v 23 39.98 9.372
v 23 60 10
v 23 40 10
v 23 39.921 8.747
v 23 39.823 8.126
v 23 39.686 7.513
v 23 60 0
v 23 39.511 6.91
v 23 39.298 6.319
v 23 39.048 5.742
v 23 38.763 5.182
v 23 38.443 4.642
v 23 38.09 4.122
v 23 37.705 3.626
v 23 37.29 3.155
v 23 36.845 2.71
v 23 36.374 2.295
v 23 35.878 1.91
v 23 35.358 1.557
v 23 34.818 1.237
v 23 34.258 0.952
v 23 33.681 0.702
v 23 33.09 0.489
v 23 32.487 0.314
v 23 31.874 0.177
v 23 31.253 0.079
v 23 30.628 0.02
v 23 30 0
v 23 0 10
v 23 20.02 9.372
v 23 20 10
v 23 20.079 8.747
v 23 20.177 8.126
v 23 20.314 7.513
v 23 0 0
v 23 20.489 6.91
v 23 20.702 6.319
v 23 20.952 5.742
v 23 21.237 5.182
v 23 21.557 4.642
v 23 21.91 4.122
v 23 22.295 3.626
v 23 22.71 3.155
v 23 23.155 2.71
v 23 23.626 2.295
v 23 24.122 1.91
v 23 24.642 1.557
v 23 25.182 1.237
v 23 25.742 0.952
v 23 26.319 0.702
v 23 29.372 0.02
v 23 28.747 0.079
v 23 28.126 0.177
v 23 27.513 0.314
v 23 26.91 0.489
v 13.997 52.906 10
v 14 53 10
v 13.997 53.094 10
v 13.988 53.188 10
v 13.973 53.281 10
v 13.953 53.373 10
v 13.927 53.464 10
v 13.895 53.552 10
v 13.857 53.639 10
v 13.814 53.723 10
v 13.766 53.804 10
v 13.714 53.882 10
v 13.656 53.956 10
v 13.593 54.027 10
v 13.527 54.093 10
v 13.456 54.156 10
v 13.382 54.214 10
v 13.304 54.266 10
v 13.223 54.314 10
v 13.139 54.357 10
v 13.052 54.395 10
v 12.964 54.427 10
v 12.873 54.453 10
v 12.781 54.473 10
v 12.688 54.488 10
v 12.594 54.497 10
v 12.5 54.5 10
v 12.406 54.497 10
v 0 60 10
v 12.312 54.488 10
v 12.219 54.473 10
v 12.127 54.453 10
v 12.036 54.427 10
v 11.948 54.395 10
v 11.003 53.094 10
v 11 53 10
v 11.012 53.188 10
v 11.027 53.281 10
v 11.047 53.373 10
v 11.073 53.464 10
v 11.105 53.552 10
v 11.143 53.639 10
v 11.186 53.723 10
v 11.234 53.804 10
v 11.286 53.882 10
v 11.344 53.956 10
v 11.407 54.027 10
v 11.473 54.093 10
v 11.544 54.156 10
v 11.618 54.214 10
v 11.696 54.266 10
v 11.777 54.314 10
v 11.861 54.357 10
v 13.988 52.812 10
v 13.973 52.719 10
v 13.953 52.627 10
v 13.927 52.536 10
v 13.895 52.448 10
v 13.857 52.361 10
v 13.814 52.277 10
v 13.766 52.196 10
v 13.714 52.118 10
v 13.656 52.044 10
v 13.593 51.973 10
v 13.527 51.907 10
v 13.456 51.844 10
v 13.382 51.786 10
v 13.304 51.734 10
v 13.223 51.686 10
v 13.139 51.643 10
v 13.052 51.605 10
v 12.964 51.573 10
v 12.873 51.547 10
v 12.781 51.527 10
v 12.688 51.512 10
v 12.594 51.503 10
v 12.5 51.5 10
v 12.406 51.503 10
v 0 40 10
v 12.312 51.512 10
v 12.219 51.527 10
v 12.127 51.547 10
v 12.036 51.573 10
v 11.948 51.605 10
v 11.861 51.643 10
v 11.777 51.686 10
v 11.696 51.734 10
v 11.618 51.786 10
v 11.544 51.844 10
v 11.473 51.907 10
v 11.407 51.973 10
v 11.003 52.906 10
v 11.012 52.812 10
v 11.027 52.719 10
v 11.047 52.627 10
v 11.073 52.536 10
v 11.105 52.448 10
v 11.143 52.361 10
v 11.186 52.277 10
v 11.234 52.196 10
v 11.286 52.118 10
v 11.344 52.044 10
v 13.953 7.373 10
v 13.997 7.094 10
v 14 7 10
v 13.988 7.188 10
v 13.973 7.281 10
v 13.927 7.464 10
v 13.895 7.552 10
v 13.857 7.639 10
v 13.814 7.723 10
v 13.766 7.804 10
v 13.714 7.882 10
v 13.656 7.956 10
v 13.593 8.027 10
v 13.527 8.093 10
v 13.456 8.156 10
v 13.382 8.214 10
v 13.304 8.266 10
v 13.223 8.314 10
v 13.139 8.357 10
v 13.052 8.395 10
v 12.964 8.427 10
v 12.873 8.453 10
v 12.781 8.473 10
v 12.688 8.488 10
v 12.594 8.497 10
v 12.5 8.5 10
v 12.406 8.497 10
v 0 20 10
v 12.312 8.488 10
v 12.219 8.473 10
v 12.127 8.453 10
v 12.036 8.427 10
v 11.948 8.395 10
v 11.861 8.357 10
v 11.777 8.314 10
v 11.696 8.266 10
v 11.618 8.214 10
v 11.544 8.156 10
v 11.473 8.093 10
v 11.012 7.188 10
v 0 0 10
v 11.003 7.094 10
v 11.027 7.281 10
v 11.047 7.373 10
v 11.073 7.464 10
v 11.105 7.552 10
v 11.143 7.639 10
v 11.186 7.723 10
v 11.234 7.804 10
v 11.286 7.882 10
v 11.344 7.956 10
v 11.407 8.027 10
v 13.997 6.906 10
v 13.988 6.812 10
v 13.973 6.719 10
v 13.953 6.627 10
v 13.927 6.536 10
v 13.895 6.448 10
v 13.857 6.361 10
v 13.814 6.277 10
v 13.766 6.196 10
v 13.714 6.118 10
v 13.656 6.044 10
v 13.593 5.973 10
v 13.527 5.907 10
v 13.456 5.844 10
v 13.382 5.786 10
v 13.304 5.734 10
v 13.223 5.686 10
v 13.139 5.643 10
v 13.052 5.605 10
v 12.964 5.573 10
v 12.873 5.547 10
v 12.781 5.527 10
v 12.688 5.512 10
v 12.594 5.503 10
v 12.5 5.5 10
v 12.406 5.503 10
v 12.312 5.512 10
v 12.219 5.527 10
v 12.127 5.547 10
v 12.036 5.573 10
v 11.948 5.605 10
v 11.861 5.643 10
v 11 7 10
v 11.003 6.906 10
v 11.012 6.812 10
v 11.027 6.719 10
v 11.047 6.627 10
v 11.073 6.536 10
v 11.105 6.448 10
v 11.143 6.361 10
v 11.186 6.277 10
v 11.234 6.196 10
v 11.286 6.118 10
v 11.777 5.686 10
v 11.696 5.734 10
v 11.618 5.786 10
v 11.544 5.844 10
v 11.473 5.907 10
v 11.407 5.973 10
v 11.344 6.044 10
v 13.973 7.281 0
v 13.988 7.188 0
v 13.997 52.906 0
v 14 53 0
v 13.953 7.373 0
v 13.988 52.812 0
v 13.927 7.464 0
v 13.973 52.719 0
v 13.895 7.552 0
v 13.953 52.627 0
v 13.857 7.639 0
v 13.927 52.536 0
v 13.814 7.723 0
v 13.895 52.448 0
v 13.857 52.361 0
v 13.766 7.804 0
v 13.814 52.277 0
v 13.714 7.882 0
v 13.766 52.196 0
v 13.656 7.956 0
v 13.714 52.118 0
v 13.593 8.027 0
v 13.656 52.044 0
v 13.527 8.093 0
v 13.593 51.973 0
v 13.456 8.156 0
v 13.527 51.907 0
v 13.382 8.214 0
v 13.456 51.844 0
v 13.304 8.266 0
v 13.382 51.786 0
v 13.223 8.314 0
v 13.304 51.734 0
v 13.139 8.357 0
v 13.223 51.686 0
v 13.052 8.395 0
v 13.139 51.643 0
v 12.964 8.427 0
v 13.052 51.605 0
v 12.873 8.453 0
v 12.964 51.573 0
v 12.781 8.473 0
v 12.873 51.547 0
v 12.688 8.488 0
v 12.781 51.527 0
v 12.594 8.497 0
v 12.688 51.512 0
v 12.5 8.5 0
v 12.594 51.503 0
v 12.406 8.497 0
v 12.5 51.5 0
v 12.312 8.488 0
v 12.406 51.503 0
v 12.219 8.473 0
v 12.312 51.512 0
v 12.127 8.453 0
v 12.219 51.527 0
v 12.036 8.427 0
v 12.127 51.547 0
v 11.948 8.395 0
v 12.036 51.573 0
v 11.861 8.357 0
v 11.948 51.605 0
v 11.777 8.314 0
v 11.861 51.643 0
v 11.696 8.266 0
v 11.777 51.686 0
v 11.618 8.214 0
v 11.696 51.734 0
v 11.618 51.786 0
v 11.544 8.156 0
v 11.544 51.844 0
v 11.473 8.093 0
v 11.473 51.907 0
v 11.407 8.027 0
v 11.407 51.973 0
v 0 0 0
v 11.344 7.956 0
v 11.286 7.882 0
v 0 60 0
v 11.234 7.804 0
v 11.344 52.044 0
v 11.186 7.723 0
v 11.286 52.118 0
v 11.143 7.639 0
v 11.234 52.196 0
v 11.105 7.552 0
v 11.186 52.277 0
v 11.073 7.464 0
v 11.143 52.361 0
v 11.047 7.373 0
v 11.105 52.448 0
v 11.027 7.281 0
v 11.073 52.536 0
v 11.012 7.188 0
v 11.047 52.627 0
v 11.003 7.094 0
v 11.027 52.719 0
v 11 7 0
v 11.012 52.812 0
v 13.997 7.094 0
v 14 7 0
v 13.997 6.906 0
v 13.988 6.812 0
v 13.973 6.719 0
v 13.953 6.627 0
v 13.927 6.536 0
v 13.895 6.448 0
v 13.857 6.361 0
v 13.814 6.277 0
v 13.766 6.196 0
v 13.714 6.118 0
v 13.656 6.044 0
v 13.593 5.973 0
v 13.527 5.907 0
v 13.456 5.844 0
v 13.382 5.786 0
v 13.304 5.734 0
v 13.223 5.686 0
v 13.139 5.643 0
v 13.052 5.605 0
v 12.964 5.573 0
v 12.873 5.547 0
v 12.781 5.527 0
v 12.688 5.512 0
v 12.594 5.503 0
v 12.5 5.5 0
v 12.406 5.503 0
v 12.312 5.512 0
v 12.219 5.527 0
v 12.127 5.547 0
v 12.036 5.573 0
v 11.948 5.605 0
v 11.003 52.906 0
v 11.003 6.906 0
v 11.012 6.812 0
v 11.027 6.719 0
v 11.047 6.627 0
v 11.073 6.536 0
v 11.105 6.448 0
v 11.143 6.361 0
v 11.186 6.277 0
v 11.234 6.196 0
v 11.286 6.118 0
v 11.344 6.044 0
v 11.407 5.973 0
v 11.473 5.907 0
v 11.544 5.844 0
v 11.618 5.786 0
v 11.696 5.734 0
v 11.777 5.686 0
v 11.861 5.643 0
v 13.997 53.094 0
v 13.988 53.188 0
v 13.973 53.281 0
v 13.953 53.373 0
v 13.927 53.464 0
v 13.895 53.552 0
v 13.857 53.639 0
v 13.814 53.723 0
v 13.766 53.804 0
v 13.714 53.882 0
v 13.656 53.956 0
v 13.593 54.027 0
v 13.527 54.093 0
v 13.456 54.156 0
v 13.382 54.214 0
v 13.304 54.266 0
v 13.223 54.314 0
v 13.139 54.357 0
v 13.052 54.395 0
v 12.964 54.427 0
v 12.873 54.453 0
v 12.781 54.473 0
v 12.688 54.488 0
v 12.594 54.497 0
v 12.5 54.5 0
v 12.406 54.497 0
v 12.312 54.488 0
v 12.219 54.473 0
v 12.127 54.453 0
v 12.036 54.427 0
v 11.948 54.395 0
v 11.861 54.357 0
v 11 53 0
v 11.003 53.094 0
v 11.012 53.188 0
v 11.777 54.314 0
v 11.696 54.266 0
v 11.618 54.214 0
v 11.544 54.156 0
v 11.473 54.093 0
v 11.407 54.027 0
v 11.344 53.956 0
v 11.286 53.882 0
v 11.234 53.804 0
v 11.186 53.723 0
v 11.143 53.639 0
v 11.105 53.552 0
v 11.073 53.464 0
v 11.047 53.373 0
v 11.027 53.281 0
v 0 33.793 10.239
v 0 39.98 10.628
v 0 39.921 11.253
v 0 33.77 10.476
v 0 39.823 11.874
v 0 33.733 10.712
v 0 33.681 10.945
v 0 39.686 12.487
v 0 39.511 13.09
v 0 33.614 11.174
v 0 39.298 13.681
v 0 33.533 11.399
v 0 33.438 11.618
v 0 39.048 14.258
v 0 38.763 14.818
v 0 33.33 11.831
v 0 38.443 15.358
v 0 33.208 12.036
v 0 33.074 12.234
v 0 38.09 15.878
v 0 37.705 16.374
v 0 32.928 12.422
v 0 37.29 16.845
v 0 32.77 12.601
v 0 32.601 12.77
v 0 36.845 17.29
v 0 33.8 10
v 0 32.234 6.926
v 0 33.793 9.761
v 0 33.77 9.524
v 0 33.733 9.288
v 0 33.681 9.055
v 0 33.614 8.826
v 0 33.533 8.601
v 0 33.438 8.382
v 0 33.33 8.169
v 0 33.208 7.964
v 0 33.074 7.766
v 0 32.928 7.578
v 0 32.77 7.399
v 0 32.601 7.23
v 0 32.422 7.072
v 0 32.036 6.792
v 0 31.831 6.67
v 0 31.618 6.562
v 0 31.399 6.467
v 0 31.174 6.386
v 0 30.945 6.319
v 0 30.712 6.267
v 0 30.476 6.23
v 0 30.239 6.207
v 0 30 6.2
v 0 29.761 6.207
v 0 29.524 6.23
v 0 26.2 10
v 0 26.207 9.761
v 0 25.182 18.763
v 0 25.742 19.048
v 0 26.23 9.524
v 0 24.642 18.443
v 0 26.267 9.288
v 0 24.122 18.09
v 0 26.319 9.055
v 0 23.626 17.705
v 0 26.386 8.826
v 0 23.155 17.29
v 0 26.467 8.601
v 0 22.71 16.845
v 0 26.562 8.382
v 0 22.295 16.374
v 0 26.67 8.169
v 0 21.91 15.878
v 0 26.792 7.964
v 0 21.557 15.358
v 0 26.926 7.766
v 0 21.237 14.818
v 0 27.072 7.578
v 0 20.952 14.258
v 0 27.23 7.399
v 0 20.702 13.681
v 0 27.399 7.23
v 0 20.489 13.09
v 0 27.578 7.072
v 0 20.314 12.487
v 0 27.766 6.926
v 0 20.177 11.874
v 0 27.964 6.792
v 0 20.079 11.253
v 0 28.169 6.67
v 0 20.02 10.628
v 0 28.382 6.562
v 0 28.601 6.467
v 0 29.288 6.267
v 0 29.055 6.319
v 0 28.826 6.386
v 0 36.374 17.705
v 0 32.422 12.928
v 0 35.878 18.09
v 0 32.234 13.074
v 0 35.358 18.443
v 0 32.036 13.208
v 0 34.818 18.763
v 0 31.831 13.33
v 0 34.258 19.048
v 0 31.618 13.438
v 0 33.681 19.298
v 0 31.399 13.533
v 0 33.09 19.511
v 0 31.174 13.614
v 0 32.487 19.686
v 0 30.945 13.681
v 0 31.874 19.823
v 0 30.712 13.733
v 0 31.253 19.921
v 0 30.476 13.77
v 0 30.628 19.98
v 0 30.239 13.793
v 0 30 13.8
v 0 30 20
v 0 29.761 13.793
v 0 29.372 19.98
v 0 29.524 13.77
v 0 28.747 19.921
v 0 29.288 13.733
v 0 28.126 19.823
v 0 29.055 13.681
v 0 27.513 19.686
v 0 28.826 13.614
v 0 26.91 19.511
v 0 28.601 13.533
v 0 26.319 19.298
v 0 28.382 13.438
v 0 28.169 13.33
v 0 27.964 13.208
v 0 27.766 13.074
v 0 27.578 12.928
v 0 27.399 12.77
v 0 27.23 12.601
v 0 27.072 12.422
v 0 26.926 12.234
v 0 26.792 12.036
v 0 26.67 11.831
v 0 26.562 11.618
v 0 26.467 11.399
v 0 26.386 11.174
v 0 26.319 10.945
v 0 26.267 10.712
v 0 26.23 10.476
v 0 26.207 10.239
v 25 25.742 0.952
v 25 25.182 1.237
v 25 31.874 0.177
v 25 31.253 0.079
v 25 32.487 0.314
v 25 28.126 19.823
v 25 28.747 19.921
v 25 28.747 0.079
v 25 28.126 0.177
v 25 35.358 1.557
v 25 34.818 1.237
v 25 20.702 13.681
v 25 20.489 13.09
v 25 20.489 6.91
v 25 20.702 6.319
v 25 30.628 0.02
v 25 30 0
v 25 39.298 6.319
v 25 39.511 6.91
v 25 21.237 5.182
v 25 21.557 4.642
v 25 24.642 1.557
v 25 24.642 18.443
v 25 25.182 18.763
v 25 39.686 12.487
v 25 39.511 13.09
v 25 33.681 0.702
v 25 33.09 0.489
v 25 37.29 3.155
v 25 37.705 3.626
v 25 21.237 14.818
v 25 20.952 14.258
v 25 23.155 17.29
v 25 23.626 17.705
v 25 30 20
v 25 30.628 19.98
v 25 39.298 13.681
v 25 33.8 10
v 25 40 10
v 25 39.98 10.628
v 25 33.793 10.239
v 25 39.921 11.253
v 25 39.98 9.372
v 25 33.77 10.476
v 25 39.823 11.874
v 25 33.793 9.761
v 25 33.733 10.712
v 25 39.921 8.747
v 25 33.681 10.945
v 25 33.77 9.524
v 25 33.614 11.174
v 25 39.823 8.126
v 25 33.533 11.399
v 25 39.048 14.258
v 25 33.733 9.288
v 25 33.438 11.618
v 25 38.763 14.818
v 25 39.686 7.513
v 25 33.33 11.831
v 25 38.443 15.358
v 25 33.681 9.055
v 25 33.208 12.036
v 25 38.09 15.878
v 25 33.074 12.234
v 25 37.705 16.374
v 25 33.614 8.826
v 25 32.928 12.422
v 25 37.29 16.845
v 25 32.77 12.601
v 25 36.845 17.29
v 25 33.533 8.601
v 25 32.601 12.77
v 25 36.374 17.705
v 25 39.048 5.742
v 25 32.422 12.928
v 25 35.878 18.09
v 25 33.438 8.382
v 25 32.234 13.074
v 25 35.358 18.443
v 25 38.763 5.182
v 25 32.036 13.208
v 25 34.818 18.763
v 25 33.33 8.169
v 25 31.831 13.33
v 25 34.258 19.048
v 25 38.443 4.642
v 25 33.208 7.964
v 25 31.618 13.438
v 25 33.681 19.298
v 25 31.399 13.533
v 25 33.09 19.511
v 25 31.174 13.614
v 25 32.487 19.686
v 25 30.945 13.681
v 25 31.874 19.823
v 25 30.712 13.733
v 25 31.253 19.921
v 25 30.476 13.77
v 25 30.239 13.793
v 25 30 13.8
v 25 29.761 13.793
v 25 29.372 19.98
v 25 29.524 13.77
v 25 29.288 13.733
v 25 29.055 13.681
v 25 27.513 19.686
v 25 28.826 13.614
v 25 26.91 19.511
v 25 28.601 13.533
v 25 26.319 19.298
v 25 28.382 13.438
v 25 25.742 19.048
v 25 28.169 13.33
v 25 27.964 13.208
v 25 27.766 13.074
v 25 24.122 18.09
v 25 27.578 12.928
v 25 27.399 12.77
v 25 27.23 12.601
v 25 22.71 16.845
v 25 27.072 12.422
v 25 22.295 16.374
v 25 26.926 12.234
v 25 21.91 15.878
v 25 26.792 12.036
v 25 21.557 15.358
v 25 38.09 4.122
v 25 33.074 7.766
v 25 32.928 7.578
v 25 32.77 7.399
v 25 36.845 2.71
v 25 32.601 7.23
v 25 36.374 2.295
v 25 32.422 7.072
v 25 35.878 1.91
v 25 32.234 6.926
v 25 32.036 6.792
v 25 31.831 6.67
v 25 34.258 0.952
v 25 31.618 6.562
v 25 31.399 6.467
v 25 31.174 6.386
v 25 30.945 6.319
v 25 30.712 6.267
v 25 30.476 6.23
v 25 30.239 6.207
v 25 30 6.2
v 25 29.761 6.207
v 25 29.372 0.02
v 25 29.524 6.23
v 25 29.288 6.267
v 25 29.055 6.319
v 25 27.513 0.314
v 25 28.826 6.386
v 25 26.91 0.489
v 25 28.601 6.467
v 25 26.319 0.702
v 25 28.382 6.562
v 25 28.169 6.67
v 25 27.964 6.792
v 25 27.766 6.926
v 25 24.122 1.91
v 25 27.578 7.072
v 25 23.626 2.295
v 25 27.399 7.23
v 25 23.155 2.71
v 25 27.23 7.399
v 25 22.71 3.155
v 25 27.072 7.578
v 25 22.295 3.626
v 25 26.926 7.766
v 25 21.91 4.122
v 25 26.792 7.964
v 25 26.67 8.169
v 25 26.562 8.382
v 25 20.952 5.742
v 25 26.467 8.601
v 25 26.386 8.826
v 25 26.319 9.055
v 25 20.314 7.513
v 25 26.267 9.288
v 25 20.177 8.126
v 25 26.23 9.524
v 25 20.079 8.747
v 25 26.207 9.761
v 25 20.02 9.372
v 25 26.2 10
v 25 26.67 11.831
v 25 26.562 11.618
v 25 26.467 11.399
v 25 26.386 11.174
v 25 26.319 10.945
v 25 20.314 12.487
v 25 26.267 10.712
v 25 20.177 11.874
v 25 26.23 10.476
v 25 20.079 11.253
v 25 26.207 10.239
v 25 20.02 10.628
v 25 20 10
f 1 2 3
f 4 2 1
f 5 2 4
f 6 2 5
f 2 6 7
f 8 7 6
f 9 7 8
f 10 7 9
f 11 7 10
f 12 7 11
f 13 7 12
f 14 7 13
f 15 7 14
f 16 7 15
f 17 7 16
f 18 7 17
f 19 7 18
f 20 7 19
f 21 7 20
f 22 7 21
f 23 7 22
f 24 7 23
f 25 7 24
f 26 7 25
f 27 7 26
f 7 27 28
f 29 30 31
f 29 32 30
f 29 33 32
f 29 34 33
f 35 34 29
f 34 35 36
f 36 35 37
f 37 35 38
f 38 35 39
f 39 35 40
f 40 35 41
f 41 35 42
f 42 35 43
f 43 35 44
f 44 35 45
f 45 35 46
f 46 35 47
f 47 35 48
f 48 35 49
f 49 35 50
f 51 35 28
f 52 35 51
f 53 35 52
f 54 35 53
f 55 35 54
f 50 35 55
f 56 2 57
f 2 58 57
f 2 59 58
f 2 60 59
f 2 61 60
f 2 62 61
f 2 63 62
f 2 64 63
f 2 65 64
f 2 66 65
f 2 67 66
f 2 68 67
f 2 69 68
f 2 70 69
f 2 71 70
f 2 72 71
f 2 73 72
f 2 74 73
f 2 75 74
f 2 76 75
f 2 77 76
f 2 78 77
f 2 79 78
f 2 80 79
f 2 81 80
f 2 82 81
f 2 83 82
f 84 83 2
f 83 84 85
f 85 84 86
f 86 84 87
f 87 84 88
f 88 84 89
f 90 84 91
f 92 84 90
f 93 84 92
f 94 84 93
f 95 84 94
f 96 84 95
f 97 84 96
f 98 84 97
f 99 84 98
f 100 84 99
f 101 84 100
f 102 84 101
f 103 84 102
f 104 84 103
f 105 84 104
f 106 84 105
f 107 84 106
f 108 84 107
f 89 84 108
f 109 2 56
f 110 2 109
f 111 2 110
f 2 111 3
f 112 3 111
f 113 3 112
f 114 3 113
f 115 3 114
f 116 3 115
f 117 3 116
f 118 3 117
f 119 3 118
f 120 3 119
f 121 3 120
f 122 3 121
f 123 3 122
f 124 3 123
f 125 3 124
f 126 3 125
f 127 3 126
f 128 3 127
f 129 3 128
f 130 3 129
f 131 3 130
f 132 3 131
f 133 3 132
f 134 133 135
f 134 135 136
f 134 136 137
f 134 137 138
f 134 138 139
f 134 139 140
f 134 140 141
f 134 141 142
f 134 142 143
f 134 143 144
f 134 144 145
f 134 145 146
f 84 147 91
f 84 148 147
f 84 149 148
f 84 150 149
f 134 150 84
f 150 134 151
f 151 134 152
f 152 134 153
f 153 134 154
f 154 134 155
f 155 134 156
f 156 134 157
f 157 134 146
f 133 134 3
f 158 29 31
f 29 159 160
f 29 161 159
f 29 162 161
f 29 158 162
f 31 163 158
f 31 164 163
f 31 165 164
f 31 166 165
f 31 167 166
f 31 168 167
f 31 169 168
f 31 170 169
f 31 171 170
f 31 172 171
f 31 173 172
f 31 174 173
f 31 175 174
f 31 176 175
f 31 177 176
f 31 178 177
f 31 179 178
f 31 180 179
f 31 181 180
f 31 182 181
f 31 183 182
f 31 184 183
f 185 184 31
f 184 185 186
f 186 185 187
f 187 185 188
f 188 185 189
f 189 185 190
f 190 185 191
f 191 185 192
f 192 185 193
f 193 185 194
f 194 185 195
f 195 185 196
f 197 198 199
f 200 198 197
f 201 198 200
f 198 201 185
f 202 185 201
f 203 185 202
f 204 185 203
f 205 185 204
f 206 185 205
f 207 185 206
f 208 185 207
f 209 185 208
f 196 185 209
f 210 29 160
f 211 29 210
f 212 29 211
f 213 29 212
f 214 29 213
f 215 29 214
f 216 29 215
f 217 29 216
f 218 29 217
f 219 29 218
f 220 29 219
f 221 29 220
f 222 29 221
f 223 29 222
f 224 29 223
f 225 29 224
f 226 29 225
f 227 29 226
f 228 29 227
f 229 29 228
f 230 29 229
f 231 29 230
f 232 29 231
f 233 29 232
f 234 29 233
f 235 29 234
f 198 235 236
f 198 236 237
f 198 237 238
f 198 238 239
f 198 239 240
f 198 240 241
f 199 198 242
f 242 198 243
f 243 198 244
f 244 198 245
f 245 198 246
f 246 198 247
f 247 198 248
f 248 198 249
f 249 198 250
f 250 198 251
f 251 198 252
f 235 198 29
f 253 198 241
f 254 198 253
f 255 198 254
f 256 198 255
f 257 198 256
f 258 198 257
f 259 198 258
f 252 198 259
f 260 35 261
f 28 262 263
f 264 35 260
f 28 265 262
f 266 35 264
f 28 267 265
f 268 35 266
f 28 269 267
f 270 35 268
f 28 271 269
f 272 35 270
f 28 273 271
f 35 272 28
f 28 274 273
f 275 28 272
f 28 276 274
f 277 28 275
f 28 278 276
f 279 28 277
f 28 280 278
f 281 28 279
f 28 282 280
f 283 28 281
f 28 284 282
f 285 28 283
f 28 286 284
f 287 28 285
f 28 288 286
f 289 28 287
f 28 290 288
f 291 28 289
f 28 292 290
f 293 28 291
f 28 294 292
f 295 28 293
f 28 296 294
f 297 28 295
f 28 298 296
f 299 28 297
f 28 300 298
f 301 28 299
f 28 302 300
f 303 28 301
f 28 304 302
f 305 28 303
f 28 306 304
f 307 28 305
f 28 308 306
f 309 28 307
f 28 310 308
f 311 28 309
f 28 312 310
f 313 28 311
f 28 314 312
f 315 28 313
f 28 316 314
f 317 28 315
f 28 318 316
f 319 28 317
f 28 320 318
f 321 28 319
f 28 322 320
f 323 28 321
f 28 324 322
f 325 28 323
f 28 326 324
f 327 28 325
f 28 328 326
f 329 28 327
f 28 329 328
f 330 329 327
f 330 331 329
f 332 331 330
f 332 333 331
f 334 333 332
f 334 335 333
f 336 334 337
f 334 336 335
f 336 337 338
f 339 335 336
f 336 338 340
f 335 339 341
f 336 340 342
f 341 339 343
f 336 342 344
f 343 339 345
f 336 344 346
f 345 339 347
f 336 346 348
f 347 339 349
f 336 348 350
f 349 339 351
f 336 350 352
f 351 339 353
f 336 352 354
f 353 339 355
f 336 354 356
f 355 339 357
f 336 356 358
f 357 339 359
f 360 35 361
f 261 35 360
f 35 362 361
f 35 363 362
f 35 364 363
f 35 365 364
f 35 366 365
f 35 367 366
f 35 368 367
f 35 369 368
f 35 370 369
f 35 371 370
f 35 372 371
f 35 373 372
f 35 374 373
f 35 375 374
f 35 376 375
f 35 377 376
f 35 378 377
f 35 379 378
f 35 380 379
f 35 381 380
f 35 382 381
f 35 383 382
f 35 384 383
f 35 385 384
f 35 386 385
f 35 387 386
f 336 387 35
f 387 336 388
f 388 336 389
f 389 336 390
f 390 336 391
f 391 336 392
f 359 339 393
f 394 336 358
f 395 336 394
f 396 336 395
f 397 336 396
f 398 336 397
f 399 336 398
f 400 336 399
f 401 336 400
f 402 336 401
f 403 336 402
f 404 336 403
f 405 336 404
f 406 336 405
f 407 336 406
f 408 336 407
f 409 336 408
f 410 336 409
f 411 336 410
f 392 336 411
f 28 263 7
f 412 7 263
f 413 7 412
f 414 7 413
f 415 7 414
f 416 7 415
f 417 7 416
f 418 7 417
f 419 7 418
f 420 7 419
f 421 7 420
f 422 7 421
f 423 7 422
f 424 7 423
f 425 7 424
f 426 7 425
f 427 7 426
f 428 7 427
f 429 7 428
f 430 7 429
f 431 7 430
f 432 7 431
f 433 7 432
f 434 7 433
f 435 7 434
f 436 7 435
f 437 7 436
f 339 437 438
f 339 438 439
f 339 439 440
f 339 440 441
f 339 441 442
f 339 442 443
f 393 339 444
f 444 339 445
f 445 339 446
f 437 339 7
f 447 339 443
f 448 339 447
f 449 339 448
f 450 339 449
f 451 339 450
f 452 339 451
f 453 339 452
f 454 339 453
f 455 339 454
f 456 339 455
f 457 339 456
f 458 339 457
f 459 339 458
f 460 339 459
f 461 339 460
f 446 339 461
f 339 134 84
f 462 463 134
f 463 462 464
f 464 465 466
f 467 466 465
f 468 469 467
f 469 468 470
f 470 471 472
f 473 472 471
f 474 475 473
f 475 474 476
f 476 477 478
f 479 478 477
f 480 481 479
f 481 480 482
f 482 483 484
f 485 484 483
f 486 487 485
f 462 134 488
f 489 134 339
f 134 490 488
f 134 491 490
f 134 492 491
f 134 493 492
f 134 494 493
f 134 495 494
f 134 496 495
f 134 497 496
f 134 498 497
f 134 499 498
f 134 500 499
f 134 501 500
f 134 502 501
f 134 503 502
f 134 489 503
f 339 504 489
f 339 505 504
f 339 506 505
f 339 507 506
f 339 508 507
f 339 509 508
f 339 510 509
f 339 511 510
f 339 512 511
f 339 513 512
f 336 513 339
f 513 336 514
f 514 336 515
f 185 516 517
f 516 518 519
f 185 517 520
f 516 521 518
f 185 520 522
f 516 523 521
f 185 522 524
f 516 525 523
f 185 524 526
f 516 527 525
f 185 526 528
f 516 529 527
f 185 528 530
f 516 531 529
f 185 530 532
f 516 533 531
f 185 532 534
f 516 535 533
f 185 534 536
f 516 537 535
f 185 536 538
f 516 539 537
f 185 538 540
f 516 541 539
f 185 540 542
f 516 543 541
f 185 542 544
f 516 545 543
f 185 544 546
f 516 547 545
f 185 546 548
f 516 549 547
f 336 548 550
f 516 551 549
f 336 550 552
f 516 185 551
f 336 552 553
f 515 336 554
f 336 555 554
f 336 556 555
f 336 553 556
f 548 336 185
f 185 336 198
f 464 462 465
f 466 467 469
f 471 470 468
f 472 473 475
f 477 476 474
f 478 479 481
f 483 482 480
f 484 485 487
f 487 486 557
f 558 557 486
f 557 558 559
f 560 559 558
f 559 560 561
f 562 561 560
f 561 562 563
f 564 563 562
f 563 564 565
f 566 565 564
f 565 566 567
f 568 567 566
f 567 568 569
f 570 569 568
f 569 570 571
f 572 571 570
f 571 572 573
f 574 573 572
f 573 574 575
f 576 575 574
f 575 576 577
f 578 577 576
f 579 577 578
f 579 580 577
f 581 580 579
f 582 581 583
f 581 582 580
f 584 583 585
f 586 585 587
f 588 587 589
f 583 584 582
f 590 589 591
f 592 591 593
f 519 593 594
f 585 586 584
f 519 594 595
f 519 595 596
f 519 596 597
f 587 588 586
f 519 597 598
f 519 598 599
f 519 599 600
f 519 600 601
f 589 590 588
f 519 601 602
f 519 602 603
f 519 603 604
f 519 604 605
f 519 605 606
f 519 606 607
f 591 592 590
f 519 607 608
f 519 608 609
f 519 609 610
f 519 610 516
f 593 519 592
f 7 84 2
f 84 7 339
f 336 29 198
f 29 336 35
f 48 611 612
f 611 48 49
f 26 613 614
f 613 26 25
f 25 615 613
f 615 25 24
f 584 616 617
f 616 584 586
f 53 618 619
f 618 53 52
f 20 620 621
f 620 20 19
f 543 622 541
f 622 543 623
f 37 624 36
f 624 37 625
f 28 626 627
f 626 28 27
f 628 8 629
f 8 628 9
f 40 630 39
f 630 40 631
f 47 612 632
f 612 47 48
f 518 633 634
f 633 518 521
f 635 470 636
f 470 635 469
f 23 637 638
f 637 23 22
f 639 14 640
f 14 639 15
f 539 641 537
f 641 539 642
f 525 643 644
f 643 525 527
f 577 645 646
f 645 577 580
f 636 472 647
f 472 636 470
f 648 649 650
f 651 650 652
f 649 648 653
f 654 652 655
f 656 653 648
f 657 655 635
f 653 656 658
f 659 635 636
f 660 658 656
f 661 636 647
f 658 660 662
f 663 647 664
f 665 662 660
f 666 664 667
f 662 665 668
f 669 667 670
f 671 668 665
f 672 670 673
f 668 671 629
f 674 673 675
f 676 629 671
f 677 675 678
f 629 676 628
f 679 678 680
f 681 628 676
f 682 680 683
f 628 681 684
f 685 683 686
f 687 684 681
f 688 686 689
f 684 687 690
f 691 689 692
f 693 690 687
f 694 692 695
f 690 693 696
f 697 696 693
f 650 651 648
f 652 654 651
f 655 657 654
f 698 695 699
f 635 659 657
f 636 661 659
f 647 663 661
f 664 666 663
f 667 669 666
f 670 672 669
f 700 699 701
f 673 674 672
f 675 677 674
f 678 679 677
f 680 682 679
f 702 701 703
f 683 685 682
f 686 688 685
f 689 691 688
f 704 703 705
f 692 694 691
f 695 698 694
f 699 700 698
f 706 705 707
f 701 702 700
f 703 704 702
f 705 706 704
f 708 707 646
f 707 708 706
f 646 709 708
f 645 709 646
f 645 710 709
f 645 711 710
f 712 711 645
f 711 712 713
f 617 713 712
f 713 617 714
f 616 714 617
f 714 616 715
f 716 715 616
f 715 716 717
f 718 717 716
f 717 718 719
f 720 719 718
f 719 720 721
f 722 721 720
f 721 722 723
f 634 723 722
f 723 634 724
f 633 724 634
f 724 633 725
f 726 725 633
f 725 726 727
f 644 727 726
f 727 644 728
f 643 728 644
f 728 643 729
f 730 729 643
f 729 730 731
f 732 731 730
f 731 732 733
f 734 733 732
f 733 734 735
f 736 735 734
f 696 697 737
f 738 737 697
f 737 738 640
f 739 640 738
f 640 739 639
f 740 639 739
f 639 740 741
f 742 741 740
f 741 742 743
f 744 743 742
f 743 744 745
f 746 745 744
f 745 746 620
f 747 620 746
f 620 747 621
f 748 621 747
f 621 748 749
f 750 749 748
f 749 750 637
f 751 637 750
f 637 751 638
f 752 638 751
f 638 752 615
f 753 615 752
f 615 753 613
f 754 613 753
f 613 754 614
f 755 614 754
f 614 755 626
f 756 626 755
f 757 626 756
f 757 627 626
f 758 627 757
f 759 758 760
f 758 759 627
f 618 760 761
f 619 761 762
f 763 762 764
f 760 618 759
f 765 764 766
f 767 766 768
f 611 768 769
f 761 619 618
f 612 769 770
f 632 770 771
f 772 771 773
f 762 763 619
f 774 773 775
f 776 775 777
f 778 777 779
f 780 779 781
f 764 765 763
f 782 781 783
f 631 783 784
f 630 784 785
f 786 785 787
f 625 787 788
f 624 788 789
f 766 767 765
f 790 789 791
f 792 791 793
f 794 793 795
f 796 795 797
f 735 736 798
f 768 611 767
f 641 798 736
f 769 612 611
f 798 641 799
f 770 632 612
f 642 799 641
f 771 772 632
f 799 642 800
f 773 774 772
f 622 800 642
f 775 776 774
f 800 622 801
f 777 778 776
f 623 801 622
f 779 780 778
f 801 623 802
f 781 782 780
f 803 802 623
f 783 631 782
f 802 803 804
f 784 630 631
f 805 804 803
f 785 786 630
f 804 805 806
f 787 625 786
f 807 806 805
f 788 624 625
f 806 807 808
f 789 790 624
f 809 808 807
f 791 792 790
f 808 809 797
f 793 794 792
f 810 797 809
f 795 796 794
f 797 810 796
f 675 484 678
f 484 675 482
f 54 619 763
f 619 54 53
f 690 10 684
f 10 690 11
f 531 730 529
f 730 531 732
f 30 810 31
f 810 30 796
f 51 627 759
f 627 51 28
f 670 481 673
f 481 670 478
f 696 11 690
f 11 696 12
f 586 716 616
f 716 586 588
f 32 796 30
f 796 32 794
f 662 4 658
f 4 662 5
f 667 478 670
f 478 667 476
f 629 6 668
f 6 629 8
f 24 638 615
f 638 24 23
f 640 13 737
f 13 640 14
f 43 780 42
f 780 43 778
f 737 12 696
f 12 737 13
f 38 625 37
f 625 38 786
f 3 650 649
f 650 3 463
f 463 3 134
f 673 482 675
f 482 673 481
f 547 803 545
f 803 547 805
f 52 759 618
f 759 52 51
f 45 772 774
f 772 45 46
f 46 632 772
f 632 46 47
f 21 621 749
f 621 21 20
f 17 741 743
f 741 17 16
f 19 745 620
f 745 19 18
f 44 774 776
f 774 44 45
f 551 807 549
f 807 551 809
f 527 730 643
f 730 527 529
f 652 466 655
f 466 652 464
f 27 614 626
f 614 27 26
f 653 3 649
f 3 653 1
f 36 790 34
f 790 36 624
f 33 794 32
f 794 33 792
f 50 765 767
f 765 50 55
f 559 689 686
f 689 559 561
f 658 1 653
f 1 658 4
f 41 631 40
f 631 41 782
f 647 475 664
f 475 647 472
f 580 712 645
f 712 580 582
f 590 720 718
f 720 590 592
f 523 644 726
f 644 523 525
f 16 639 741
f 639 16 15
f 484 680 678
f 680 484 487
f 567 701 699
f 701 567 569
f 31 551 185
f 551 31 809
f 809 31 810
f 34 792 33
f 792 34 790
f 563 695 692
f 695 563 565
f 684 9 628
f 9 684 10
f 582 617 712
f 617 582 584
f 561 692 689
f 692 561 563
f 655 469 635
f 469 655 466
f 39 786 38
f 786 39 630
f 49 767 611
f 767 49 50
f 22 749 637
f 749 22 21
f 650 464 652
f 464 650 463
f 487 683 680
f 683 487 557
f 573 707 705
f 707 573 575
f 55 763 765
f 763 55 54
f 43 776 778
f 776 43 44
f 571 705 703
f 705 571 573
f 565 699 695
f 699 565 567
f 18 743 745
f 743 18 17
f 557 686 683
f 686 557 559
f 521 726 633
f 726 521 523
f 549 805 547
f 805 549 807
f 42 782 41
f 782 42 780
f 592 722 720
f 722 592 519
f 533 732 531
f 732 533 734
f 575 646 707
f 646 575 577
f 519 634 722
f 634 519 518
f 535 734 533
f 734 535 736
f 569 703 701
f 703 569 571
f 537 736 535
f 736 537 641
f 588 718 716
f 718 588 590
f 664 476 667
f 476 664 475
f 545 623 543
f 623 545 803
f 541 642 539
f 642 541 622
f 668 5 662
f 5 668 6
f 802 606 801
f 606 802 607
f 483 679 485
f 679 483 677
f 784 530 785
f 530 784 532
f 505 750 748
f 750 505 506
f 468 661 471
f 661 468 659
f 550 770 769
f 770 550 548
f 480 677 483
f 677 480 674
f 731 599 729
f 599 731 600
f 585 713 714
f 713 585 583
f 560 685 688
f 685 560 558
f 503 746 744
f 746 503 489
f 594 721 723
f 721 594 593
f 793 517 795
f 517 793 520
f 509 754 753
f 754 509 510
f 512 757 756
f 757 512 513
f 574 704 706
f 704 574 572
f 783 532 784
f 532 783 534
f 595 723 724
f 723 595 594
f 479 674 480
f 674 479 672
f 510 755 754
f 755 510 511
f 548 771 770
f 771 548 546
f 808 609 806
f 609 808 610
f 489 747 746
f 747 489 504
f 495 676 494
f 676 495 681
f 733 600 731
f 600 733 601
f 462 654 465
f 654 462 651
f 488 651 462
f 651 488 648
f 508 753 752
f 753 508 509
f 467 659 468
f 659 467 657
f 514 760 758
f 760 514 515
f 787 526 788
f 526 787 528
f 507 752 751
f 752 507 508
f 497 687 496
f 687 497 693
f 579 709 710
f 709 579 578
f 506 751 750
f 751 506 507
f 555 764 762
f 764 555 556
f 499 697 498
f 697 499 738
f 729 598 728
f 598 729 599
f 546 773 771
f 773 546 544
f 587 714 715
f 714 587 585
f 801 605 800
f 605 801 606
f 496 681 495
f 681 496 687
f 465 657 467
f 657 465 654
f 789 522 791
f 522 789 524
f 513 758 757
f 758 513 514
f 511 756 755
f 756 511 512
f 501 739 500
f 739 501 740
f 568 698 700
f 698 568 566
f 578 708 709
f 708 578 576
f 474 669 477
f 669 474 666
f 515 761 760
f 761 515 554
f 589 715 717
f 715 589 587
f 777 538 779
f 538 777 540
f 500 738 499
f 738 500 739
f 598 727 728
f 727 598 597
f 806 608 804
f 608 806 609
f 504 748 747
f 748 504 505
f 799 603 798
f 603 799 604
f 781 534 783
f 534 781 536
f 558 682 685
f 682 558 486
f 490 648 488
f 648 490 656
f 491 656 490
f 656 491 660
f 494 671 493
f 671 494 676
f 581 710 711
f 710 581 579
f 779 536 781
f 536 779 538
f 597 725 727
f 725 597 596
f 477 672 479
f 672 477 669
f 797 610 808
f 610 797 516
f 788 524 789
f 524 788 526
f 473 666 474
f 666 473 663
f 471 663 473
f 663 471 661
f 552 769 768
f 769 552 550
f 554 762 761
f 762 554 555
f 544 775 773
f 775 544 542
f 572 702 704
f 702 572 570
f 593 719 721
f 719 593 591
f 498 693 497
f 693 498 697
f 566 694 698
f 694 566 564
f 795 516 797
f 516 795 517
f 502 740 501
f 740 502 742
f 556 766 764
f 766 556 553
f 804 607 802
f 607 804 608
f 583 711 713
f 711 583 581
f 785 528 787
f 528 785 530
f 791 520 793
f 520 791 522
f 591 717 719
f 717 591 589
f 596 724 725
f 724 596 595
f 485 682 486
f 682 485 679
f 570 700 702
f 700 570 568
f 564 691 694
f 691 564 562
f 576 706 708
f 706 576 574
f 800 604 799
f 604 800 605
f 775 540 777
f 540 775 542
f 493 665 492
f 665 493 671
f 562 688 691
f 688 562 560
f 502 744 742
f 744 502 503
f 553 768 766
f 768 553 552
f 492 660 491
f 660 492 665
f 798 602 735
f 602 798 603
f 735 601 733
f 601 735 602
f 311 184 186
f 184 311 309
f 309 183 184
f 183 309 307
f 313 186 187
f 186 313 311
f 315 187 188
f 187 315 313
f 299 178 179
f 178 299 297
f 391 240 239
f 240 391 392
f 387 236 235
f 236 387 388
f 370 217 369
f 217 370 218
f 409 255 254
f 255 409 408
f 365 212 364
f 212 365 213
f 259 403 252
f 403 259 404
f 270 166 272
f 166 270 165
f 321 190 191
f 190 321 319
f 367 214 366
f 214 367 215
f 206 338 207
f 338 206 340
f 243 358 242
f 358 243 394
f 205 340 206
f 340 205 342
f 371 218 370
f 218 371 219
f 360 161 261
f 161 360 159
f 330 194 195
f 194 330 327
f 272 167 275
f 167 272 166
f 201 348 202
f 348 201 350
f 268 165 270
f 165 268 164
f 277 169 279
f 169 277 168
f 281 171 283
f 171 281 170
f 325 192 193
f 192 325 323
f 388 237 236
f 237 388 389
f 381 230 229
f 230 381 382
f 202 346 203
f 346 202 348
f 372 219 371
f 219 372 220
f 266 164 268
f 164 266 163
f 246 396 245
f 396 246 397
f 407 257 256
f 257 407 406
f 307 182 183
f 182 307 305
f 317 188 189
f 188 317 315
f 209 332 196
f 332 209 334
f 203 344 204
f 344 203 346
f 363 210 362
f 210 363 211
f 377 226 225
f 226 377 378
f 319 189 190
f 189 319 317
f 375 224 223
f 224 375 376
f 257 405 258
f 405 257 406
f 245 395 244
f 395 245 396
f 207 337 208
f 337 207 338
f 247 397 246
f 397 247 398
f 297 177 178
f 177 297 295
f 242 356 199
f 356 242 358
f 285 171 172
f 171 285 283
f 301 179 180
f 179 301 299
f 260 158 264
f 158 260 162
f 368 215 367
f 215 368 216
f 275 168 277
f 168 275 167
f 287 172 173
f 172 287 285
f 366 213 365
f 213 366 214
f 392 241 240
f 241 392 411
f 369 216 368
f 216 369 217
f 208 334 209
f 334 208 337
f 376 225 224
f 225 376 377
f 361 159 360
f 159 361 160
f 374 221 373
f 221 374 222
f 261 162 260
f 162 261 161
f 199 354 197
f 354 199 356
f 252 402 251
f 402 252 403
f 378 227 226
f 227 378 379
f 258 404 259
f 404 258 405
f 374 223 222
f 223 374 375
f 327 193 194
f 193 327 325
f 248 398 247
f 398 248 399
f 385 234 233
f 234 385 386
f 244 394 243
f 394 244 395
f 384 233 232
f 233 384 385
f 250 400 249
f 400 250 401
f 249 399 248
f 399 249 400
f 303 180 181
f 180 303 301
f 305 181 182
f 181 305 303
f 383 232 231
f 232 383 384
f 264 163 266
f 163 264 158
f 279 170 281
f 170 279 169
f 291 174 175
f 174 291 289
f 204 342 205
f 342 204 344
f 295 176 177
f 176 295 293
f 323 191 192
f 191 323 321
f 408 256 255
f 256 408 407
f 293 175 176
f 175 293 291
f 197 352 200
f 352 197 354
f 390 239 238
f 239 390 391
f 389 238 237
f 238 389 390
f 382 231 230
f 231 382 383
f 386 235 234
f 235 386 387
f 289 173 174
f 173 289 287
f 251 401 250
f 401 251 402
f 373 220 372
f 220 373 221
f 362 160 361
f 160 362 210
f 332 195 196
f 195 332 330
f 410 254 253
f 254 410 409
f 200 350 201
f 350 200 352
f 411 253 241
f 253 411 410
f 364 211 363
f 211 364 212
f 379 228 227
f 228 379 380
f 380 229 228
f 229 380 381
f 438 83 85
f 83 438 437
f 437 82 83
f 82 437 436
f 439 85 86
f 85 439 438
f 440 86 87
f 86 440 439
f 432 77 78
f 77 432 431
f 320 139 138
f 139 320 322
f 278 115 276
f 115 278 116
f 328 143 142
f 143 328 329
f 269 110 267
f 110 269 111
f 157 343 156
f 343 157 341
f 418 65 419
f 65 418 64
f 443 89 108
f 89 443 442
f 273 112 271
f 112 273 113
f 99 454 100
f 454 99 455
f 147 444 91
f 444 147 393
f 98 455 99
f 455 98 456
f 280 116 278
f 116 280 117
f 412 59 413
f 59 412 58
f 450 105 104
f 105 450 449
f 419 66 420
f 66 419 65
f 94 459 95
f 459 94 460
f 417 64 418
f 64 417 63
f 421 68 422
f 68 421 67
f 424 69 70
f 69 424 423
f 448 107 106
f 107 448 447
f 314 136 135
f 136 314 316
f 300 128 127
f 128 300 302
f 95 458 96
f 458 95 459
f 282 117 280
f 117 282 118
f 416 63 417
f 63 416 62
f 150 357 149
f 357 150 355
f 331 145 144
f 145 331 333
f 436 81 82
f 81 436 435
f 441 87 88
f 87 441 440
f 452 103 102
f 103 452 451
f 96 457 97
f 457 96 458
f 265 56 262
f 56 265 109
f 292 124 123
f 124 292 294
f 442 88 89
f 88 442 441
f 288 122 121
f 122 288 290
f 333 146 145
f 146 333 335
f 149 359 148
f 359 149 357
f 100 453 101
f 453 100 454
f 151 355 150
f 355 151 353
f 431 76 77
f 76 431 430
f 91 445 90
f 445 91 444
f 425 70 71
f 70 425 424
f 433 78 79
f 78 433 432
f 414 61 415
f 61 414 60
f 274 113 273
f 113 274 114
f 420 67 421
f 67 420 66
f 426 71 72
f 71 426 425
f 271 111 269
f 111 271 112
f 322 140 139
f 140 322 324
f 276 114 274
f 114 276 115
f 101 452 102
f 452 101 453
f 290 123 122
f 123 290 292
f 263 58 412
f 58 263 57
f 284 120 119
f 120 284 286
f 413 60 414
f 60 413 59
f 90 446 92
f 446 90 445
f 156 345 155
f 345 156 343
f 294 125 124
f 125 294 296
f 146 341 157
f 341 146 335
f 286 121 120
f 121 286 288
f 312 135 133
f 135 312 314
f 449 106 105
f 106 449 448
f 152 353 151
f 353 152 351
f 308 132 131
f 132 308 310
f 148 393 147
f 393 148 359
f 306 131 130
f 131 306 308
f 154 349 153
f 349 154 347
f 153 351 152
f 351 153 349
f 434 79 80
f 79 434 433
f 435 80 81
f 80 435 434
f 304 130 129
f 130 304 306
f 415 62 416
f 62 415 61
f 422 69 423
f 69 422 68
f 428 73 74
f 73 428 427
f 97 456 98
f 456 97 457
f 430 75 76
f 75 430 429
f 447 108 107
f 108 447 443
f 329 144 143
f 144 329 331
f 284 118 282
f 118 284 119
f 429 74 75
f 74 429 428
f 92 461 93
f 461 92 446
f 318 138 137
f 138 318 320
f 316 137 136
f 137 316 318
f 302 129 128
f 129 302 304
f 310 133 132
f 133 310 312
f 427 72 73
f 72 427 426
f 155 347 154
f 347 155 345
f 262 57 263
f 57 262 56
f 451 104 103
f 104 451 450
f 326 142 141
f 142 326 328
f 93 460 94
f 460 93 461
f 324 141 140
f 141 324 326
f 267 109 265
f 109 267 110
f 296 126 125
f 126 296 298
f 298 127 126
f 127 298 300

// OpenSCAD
difference(){
	union(){

       translate([0,0,0]){
           cube([23,60,10], center=false);
       }

       translate([0,30,10]){
            rotate(a = [0,90,0]) {
              cylinder(h=25, r=10, $fn=100, center=false);
            }
       }	


	}
	union() {
       translate([-10,30,10]){
            rotate(a = [0,90,0]) {
              cylinder(h=100, r=3.8, $fn=100, center=false);
            }
       }	
       translate([12.5,7,-10]){
            rotate(a = [0,0,90]) {
              cylinder(h=100, r=1.5, $fn=100, center=false);
            }
       }	
       translate([12.5,60-7,-10]){
            rotate(a = [0,0,90]) {
              cylinder(h=100, r=1.5, $fn=100, center=false);
            }
       }	




        
	}
}
